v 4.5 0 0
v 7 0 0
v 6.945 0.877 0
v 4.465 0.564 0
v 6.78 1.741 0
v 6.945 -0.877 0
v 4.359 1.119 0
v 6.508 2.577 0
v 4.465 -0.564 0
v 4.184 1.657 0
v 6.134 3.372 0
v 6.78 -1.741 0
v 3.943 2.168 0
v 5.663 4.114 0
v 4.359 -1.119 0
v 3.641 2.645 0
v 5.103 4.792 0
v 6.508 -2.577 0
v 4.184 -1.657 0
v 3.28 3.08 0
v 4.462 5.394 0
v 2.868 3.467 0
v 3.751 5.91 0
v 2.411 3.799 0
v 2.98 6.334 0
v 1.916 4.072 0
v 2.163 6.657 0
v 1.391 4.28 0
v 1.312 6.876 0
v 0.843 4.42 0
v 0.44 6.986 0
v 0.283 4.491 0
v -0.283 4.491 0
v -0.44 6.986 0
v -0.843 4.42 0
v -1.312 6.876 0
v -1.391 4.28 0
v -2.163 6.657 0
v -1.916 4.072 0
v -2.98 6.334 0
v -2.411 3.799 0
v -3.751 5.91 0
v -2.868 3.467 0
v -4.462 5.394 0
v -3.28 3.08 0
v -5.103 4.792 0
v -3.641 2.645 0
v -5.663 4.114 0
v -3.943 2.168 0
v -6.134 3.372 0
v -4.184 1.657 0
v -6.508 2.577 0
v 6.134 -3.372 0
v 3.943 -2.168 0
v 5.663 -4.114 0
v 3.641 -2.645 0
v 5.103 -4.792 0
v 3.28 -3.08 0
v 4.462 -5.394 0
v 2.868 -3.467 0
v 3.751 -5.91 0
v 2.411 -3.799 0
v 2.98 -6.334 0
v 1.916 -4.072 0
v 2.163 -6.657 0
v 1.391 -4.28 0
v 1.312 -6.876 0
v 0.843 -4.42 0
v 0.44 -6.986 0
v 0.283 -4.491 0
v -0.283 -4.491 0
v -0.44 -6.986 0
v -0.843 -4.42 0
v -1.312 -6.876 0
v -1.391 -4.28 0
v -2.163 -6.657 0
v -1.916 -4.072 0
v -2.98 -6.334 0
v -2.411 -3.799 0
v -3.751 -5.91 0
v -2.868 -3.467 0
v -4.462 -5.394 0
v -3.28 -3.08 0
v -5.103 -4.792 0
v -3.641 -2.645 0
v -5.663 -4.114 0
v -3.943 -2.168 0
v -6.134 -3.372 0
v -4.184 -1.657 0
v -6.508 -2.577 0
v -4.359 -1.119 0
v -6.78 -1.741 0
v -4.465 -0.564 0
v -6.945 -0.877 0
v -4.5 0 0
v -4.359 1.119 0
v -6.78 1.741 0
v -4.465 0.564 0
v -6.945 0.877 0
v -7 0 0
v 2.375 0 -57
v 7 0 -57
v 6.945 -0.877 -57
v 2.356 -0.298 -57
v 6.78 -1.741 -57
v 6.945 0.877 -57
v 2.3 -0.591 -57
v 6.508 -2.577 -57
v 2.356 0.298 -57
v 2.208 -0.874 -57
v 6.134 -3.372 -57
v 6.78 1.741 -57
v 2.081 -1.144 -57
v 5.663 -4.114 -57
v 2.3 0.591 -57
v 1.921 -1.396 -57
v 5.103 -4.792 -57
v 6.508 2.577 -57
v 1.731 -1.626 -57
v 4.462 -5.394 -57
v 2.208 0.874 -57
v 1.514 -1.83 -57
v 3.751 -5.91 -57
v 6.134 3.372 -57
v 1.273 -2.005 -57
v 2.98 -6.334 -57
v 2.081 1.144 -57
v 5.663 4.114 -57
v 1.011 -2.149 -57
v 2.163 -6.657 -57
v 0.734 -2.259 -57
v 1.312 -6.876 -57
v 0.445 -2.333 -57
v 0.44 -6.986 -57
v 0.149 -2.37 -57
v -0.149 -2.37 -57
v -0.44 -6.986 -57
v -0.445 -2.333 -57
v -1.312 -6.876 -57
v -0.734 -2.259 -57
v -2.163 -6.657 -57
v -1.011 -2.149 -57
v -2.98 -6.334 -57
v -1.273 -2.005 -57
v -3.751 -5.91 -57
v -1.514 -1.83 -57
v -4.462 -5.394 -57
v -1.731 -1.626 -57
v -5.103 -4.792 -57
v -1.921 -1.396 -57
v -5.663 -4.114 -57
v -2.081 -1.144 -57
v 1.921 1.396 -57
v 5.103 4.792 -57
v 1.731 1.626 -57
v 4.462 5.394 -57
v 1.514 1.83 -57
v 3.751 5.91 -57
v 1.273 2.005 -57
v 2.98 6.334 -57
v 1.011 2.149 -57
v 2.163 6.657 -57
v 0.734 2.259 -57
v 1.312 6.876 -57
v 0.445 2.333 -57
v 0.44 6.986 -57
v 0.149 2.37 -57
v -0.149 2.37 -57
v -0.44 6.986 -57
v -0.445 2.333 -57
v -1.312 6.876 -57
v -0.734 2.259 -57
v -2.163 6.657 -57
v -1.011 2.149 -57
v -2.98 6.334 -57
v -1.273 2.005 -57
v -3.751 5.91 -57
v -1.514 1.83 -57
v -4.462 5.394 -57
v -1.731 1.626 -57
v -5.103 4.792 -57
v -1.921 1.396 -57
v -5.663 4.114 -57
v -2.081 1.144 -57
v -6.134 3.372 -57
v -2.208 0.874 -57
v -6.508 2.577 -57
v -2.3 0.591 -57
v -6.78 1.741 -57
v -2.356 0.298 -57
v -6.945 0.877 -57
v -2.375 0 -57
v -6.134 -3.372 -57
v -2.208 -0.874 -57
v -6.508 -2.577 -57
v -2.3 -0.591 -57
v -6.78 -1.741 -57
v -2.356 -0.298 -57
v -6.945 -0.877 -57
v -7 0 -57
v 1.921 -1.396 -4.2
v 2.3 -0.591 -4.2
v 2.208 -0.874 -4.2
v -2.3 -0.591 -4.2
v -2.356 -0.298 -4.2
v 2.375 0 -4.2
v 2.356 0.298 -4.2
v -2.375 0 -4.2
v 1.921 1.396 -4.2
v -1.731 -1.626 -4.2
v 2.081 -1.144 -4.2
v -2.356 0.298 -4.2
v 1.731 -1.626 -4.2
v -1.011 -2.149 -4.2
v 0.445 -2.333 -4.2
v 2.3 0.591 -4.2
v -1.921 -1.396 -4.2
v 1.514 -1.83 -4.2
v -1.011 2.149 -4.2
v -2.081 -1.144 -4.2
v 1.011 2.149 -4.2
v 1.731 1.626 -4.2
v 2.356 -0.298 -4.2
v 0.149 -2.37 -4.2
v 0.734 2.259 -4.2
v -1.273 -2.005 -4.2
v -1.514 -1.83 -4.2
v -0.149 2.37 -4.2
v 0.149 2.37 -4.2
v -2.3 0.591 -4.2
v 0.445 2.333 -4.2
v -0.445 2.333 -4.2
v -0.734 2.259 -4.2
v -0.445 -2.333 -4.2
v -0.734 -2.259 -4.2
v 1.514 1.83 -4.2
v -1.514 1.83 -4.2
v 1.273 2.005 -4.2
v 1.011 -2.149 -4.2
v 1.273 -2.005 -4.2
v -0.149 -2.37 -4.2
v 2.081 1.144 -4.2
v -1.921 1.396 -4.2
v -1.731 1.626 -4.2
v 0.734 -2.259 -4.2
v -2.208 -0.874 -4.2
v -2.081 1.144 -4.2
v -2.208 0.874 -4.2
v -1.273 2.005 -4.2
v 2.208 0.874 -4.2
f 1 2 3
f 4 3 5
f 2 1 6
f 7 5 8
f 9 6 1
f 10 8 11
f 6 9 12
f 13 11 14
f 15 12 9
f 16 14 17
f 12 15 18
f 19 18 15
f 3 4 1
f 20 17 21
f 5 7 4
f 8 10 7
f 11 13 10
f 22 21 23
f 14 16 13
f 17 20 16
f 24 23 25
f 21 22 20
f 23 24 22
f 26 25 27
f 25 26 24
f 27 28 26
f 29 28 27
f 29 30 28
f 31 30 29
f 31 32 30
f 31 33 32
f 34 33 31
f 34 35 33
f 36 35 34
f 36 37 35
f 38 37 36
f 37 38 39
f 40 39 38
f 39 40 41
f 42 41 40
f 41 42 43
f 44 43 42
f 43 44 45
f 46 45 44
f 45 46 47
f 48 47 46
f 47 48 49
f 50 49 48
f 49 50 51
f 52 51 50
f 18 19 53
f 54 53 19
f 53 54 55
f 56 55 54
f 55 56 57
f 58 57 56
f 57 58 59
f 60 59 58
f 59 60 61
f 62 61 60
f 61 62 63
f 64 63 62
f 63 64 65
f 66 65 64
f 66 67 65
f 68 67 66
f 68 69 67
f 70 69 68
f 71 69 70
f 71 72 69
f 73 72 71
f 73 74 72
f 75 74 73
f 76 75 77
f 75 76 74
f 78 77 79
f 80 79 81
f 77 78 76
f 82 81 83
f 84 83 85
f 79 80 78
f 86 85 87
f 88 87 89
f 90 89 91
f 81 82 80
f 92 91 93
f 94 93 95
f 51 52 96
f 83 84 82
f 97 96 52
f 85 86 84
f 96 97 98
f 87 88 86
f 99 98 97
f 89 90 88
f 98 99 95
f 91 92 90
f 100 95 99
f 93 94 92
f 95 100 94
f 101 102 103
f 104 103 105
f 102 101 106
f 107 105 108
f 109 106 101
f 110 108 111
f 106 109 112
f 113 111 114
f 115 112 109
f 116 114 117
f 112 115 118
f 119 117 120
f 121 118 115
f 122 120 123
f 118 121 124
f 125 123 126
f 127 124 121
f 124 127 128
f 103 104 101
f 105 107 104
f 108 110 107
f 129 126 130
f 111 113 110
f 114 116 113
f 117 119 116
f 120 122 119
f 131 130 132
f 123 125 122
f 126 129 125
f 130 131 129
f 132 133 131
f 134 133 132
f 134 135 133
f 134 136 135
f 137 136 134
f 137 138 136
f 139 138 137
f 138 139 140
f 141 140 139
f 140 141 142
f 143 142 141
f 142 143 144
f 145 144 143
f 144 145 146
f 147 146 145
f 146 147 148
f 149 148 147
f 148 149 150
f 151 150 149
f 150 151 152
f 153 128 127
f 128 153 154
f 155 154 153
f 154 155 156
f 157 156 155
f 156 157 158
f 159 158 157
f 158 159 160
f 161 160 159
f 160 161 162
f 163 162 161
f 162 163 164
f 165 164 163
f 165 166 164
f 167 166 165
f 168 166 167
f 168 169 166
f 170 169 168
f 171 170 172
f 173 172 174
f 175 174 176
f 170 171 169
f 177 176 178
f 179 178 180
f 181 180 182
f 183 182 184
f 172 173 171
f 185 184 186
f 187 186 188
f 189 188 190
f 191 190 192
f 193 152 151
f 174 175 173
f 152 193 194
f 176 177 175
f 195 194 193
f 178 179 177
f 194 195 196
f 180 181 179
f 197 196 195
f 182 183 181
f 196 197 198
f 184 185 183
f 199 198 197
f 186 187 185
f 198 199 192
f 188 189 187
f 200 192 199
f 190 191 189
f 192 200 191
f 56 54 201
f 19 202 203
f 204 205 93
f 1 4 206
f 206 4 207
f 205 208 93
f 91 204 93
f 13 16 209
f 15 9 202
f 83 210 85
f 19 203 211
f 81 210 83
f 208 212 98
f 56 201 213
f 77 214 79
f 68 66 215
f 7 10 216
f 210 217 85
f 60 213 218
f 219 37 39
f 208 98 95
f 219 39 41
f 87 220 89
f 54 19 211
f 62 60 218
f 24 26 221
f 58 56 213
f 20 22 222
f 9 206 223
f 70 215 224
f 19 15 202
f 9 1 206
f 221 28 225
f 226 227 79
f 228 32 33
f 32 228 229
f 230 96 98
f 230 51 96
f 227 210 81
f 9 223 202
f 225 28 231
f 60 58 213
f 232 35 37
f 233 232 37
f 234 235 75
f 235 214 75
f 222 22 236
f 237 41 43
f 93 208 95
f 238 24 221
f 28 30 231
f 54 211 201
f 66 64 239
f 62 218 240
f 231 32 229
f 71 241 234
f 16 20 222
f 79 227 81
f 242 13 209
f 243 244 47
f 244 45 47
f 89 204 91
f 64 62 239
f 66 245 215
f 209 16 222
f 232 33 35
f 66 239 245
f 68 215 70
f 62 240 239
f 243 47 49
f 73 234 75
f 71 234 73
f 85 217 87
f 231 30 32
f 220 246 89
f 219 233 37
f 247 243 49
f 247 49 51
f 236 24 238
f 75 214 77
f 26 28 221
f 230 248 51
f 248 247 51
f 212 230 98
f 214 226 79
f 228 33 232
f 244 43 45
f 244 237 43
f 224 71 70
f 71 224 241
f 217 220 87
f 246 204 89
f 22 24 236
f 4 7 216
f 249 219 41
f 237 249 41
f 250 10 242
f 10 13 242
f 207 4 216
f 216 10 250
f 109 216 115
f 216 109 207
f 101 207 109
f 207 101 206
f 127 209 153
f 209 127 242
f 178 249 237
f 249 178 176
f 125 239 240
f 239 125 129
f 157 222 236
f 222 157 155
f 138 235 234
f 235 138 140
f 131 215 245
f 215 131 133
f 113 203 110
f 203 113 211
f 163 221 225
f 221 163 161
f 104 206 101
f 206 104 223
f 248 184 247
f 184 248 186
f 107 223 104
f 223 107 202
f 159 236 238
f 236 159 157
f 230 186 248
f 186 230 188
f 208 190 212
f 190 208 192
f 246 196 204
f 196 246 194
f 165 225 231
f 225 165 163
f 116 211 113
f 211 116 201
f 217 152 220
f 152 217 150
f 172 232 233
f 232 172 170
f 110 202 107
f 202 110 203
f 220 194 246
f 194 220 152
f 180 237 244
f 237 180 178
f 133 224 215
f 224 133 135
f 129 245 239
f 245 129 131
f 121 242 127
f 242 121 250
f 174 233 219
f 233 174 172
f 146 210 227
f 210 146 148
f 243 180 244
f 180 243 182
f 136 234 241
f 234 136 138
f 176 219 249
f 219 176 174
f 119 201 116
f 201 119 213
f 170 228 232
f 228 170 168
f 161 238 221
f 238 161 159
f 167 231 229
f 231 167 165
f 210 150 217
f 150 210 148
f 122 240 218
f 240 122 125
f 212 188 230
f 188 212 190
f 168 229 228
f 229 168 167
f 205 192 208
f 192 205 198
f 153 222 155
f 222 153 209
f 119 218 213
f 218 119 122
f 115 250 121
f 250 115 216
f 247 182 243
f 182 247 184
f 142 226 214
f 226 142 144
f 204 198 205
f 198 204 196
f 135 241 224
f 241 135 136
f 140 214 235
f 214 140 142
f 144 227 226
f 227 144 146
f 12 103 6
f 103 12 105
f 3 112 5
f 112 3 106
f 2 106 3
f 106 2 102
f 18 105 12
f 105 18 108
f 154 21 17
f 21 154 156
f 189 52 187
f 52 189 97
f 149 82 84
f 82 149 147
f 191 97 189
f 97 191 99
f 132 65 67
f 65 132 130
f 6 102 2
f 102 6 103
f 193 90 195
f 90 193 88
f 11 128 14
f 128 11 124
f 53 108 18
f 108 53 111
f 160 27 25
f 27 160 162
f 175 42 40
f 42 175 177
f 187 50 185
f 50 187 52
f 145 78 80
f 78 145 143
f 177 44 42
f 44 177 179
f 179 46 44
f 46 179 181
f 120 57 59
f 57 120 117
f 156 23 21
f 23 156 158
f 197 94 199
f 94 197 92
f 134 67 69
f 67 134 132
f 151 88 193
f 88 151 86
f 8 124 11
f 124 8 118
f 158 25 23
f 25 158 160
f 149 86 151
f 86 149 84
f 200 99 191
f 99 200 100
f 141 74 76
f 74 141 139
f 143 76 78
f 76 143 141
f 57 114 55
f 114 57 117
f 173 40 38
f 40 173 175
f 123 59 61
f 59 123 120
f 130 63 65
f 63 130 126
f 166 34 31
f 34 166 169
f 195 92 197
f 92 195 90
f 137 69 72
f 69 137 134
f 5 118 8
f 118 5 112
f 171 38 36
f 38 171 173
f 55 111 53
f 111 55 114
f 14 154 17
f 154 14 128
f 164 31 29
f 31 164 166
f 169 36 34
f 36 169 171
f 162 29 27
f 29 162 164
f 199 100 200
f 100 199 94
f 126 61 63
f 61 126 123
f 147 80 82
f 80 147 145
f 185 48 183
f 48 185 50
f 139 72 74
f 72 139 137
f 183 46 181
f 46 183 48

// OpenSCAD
$fn = 50;


difference() {
	union() {
		translate(v = [0, 0, -57.0000000000]) {
			cylinder(h = 57, r = 7.0000000000);
		}
		cylinder(h = 0, r = 16.0000000000);
	}
	union() {
		translate(v = [0, 0, 0]) {
			rotate(a = [0, 0, 0]) {
				difference() {
					union() {
						#translate(v = [0, 0, -57.0000000000]) {
							cylinder(h = 57, r = 2.2500000000);
						}
						#translate(v = [0, 0, -4.2000000000]) {
							cylinder(h = 4.2000000000, r = 7.0000000000, r1 = 2.3750000000, r2 = 4.5000000000);
						}
						#translate(v = [0, 0, -57.0000000000]) {
							cylinder(h = 57, r = 2.3750000000);
						}
						#translate(v = [0, 0, -57.0000000000]) {
							cylinder(h = 57, r = 2.2500000000);
						}
					}
					union();
				}
			}
		}
	}
}
